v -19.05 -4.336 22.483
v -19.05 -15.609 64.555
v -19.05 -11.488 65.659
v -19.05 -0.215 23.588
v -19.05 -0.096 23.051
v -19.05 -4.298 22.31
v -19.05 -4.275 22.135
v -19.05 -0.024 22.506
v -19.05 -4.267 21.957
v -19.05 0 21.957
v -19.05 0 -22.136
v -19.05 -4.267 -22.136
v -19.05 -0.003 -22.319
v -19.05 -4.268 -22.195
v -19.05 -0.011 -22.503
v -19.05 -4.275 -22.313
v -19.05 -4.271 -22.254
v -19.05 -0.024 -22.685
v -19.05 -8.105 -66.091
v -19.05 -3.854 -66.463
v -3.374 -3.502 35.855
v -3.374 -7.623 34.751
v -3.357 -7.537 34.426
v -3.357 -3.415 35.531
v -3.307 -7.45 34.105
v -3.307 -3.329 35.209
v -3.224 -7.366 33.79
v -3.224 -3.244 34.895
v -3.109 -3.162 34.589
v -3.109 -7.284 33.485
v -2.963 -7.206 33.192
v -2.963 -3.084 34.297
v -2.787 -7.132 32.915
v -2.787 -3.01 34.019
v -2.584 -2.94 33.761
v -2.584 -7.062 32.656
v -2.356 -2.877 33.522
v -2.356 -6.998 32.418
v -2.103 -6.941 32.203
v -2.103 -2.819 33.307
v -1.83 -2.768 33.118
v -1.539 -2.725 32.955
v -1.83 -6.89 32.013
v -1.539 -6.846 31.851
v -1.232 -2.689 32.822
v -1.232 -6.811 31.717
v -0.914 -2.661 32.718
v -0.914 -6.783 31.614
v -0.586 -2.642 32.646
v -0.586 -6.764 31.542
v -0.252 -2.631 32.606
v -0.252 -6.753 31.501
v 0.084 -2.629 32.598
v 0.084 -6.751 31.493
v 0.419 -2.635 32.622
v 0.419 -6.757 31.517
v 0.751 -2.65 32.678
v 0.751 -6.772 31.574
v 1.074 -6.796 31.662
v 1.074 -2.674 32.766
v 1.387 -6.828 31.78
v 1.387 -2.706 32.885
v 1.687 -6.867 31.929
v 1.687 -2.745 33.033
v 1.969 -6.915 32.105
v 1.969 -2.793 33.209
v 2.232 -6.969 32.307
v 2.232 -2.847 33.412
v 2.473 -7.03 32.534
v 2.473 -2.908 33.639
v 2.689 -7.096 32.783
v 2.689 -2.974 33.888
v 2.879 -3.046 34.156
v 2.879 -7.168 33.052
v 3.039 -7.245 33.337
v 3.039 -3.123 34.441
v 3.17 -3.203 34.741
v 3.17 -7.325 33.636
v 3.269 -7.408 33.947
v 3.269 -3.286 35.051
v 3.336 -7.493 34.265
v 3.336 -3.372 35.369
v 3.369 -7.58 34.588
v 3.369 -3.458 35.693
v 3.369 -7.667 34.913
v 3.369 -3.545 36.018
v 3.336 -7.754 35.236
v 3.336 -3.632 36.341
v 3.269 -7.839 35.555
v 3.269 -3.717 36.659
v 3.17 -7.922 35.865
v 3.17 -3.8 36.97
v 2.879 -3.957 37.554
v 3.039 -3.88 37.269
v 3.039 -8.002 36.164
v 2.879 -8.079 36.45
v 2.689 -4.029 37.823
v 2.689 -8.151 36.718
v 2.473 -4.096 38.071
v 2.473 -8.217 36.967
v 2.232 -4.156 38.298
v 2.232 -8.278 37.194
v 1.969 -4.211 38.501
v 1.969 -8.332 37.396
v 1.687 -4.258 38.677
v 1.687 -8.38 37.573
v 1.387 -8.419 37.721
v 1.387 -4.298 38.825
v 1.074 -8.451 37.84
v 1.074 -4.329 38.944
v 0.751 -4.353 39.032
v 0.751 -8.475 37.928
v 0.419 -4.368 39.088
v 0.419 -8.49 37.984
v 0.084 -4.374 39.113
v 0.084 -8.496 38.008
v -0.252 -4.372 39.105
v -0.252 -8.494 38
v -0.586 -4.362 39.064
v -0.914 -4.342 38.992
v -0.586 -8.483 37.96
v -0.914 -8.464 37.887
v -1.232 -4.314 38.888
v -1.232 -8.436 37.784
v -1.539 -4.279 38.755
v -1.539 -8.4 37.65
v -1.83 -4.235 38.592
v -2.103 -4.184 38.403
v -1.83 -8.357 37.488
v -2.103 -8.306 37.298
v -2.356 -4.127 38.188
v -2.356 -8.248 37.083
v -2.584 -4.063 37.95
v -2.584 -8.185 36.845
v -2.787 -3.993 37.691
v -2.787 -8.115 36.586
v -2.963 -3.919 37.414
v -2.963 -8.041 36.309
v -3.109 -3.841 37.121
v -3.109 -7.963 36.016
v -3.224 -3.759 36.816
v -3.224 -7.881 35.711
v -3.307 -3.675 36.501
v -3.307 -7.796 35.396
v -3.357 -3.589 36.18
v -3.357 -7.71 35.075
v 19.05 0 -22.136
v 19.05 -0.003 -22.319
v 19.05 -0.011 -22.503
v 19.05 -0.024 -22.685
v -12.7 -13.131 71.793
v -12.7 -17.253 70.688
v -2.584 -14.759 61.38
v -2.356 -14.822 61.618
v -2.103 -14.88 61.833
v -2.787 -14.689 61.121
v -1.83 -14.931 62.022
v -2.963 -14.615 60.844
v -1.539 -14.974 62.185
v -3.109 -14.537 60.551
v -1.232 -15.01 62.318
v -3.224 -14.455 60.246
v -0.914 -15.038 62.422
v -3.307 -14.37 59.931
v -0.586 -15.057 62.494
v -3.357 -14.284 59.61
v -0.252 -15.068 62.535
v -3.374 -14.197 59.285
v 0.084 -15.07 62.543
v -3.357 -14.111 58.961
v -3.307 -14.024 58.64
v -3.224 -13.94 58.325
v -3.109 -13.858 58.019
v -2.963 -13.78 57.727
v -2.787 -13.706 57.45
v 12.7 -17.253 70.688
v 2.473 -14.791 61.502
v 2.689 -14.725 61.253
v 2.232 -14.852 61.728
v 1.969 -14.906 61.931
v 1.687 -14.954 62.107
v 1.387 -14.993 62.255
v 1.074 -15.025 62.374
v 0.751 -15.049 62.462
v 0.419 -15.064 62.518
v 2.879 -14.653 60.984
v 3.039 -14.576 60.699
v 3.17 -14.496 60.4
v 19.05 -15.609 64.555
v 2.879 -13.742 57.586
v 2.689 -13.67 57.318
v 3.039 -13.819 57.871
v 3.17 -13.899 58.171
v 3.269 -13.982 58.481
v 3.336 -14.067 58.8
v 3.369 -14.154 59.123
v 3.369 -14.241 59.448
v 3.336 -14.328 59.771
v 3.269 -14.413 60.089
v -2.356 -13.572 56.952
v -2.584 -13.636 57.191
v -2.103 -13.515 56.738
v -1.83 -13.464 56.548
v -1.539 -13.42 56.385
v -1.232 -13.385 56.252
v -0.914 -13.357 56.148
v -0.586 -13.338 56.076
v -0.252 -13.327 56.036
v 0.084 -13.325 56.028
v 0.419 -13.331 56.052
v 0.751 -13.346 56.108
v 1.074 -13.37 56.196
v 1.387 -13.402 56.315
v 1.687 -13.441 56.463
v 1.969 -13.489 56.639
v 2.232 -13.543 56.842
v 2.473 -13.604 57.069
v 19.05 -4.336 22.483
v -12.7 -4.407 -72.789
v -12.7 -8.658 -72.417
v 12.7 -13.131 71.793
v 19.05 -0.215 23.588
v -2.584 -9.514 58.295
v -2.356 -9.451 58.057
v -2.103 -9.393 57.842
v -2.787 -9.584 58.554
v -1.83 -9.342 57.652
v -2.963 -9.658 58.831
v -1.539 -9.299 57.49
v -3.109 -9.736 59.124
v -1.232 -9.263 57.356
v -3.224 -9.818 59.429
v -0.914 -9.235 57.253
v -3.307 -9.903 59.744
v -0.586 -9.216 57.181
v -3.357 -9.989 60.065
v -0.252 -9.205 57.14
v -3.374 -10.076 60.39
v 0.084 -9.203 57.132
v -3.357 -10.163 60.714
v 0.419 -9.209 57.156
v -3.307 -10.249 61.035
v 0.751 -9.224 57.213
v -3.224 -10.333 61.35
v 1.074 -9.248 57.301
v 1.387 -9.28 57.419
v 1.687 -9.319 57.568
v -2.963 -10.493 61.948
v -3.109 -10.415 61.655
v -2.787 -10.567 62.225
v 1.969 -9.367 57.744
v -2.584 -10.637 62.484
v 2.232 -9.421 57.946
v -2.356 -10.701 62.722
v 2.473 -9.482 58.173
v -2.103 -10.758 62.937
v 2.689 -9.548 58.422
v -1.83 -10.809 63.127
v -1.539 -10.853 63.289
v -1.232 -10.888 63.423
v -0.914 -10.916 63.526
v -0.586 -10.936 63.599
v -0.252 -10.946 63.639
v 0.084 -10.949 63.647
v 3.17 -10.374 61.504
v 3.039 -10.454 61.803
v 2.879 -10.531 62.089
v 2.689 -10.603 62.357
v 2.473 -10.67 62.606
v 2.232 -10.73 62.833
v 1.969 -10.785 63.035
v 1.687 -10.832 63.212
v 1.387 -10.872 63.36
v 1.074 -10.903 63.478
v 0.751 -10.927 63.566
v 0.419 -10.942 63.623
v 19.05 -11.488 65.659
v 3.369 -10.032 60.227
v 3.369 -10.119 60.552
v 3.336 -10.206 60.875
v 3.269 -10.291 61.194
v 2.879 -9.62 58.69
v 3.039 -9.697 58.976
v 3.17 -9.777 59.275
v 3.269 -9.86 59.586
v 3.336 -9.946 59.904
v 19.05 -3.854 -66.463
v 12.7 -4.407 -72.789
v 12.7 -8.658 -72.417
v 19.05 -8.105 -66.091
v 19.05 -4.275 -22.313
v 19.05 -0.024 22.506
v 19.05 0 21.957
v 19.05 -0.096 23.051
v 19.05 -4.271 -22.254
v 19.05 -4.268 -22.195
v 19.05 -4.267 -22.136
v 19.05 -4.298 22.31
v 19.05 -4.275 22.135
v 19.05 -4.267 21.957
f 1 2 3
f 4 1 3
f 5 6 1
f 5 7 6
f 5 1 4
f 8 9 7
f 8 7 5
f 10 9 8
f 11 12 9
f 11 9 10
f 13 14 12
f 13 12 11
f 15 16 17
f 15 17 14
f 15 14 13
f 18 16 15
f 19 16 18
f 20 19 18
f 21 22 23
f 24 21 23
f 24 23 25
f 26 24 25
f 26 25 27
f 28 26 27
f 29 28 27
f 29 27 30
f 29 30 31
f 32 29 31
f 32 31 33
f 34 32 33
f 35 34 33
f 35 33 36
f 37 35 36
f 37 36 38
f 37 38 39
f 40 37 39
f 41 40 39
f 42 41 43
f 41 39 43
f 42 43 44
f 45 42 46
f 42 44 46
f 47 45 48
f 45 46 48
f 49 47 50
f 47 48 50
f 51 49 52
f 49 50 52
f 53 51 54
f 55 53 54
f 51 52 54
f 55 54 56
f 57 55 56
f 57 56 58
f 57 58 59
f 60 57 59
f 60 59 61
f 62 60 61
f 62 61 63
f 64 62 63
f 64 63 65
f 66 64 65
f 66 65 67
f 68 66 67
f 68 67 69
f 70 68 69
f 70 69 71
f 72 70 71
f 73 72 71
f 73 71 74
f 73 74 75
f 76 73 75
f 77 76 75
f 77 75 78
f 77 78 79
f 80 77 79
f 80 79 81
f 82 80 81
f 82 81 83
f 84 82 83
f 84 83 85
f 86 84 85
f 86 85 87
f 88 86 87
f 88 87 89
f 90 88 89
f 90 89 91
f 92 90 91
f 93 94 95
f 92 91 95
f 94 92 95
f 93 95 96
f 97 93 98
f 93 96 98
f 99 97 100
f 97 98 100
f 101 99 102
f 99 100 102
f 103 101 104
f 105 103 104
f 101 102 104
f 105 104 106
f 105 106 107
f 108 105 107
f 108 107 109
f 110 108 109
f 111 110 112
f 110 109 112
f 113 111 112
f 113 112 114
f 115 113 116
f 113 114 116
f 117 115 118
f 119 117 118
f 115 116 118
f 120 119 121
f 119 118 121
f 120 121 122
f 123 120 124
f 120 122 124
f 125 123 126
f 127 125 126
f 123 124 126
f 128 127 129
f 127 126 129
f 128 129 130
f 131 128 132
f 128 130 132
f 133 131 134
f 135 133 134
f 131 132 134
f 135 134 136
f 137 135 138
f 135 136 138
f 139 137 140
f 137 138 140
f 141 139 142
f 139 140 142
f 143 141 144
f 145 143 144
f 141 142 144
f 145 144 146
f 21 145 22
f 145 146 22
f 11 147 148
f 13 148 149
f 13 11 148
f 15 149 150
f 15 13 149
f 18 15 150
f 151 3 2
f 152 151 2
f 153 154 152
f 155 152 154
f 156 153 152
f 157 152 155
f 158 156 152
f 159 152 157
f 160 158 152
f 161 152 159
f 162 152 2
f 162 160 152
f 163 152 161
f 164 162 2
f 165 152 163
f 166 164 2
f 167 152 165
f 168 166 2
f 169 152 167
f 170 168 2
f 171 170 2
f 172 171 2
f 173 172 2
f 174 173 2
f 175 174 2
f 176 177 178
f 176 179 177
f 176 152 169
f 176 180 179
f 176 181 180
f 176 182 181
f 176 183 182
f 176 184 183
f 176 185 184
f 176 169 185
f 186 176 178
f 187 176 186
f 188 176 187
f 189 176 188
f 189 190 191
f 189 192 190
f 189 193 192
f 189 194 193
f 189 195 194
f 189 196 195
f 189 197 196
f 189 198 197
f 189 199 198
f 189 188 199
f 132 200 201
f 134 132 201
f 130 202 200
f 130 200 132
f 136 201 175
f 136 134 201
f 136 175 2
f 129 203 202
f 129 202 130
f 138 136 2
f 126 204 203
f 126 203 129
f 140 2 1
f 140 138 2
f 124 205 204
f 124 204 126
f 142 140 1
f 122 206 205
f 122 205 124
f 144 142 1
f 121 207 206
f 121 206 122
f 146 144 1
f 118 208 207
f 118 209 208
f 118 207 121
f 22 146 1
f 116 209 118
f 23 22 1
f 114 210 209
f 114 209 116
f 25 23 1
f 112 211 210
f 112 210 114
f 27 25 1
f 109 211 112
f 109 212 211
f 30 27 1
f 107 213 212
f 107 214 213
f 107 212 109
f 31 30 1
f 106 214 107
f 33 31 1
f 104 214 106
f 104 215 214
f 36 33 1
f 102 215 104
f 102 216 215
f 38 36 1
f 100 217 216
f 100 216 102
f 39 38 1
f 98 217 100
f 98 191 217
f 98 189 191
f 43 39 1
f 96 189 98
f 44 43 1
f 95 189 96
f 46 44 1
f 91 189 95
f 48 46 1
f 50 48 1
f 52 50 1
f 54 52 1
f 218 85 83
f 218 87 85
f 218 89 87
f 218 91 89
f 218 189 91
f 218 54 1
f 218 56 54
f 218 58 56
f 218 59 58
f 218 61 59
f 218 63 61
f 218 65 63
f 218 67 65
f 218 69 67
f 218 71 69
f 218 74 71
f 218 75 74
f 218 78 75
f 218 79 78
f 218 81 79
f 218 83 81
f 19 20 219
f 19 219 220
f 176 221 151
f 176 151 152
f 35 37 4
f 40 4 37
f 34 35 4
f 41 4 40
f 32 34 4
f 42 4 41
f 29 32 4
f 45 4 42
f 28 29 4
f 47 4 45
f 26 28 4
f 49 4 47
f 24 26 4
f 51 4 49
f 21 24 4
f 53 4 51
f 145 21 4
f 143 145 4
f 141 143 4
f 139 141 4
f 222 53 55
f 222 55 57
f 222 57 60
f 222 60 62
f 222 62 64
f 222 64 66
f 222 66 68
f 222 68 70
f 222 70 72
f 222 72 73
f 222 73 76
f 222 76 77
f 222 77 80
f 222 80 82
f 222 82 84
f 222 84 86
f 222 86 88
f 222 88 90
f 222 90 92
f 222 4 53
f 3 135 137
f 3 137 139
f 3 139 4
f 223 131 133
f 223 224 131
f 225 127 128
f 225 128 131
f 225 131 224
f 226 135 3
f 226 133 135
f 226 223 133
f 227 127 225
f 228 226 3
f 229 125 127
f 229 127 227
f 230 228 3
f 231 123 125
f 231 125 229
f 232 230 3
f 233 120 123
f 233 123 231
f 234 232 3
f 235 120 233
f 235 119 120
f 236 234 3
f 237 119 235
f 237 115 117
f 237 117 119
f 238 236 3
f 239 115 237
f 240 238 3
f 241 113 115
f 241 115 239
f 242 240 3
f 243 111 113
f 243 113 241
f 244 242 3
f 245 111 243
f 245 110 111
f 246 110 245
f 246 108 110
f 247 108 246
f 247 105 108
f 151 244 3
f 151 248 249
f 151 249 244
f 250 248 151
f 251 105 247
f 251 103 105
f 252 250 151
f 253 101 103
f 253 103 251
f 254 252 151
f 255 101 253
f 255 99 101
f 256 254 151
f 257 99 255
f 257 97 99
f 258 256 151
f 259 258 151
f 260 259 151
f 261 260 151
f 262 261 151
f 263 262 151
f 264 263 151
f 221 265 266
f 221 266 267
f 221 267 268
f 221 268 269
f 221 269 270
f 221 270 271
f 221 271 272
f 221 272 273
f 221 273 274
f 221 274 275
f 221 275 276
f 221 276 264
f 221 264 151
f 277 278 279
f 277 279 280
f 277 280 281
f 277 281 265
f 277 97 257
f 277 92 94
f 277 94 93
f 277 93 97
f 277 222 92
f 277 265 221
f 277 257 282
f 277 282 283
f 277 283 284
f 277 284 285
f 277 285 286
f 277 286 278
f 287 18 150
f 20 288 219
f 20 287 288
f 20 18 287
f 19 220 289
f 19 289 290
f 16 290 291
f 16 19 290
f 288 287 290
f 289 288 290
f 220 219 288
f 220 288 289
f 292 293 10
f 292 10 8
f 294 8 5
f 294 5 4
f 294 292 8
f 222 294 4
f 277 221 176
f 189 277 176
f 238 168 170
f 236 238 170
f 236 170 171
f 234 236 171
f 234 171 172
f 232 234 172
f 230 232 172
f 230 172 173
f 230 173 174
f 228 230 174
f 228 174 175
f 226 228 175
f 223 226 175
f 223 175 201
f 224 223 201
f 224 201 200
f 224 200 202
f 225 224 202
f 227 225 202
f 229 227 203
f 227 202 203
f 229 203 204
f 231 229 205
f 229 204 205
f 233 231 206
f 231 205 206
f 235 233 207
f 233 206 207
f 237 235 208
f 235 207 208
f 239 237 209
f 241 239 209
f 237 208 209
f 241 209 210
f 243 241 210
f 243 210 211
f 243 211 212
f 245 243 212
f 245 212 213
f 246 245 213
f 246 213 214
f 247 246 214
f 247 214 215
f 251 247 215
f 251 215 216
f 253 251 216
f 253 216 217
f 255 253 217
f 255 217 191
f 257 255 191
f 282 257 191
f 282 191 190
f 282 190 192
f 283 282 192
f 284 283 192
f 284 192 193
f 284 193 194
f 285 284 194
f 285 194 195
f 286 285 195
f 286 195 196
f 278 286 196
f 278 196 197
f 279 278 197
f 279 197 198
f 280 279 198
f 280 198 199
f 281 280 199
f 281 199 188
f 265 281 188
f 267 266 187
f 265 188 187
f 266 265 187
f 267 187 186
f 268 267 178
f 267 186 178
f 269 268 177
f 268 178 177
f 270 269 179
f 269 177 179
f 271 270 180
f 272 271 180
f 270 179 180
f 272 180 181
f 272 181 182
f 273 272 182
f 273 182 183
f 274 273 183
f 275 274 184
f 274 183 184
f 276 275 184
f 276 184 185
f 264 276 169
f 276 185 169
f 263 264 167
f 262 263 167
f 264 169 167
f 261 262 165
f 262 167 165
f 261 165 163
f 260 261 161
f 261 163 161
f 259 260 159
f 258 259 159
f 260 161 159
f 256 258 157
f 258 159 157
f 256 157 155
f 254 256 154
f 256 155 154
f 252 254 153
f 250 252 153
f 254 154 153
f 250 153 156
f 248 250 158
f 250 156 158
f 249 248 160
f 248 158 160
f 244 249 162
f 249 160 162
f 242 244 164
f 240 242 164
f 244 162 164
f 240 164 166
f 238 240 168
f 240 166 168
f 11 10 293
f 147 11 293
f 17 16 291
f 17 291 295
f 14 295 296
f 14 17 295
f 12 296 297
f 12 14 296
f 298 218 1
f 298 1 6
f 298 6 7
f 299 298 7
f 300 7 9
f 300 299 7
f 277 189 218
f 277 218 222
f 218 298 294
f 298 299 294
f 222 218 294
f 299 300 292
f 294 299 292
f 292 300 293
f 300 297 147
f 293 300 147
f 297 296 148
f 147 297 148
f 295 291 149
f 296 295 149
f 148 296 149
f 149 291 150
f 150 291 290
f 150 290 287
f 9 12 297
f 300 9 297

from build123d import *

# Parameters (mm, degrees)
SKETCH1_W                        = 38.1
SKETCH1_H                        = 44.45
BASE_FLANGE1_DEPTH               = 4.2672
EDGE_FLANGE1_STRIP_CUT_DEPTH     = 38.1
EDGE_FLANGE1_DEPTH               = 38.1
EDGE_FLANGE2_STRIP_CUT_DEPTH     = 38.1
EDGE_FLANGE2_DEPTH               = 38.1
CHAMFER1_SIZE                    = 6.35
F_17_64_0_26563_DIAMETER_HOLE1_D = 6.747002


# Sheet-metal steps are written as plain solids
with BuildPart() as part:
    # Sketch1 → Base-Flange1 (new body)
    with BuildSketch(Plane(origin=(0, 0, 0), x_dir=(1, 0, 0), z_dir=(0, 1, 0))):
        Rectangle(SKETCH1_W, SKETCH1_H)
    extrude(amount=-BASE_FLANGE1_DEPTH)

    # Edge-Flange1 strip (across the edge) → Edge-Flange1 strip cut (cut)
    with BuildSketch(Plane(origin=(19.05, -4.2672, 22.225), x_dir=(0, -0.96592582628907, -0.2588190451025146), z_dir=(-1, 0, 0))):
        Polygon((-9.522131081, 19.049882248), (-4.052559965, -1.362835054), (0.069238721, -0.258402425), (-5.400332395, 20.154314877), align=None)
    extrude(amount=EDGE_FLANGE1_STRIP_CUT_DEPTH, mode=Mode.SUBTRACT)

    # Edge-Flange1 section (across the edge) → Edge-Flange1 (add)
    with BuildSketch(Plane(origin=(19.05, -4.2672, 22.225), x_dir=(0, -0.96592582628907, -0.2588190451025146), z_dir=(-1, 0, 0))):
        with BuildLine():
            Line((-4.2672, 0.267517875), (-4.2672, 50.17300498))
            Line((-4.2672, 50.17300498), (0, 50.17300498))
            Line((0, 50.17300498), (0, 0.267517875))
            ThreePointArc((0, 0.267517875), (0.017384042, 0.002288653), (0.069238721, -0.258402425))
            Line((0.069238721, -0.258402425), (-4.052559965, -1.362835054))
            ThreePointArc((-4.052559965, -1.362835054), (-4.213309471, -0.554692715), (-4.2672, 0.267517875))
        make_face()
    extrude(amount=EDGE_FLANGE1_DEPTH)

    # Edge-Flange2 strip (across the edge) → Edge-Flange2 strip cut (cut)
    with BuildSketch(Plane(origin=(-19.05, -4.2672, -22.225), x_dir=(0, -0.9961946980917461, 0.08715574274765156), z_dir=(1, 0, 0))):
        Polygon((-6.085074523, 20.592090897), (-4.243229642, -0.460292419), (0.007732373, -0.088381433), (-1.834112507, 20.964001883), align=None)
    extrude(amount=EDGE_FLANGE2_STRIP_CUT_DEPTH, mode=Mode.SUBTRACT)

    # Edge-Flange2 section (across the edge) → Edge-Flange2 (add)
    with BuildSketch(Plane(origin=(-19.05, -4.2672, -22.225), x_dir=(0, -0.9961946980917461, 0.08715574274765156), z_dir=(1, 0, 0))):
        with BuildLine():
            Line((-4.2672, 0.088719036), (-4.2672, 50.38333524))
            Line((-4.2672, 50.38333524), (0, 50.38333524))
            Line((0, 50.38333524), (0, 0.088719036))
            ThreePointArc((0, 0.088719036), (0.001934014, 8.4441e-05), (0.007732373, -0.088381433))
            Line((0.007732373, -0.088381433), (-4.243229642, -0.460292419))
            ThreePointArc((-4.243229642, -0.460292419), (-4.261204557, -0.186048209), (-4.2672, 0.088719036))
        make_face()
    extrude(amount=EDGE_FLANGE2_DEPTH)

    # Chamfer1
    chamfer1_edges = [part.edges().sort_by_distance(p)[0] for p in [
        (19.05, -15.192029896, 71.240617608),
        (-19.05, -15.192029896, 71.240617608),
        (-19.05, -6.532915997, -72.602566931),
        (19.05, -6.532915997, -72.602566931),
    ]]
    chamfer(chamfer1_edges, length=CHAMFER1_SIZE)

    # 17/64 (0.26563) Diameter Hole1 (through all)
    with Locations(Plane(origin=(0, 5.696696884, 1.52642533), x_dir=(1, 0, 0), z_dir=(0, 0.9659258262890699, 0.25881904510251463))):
        with Locations((0, -35.539651994), (0, -60.939651994)):
            Hole(F_17_64_0_26563_DIAMETER_HOLE1_D / 2)


solid = part.part
